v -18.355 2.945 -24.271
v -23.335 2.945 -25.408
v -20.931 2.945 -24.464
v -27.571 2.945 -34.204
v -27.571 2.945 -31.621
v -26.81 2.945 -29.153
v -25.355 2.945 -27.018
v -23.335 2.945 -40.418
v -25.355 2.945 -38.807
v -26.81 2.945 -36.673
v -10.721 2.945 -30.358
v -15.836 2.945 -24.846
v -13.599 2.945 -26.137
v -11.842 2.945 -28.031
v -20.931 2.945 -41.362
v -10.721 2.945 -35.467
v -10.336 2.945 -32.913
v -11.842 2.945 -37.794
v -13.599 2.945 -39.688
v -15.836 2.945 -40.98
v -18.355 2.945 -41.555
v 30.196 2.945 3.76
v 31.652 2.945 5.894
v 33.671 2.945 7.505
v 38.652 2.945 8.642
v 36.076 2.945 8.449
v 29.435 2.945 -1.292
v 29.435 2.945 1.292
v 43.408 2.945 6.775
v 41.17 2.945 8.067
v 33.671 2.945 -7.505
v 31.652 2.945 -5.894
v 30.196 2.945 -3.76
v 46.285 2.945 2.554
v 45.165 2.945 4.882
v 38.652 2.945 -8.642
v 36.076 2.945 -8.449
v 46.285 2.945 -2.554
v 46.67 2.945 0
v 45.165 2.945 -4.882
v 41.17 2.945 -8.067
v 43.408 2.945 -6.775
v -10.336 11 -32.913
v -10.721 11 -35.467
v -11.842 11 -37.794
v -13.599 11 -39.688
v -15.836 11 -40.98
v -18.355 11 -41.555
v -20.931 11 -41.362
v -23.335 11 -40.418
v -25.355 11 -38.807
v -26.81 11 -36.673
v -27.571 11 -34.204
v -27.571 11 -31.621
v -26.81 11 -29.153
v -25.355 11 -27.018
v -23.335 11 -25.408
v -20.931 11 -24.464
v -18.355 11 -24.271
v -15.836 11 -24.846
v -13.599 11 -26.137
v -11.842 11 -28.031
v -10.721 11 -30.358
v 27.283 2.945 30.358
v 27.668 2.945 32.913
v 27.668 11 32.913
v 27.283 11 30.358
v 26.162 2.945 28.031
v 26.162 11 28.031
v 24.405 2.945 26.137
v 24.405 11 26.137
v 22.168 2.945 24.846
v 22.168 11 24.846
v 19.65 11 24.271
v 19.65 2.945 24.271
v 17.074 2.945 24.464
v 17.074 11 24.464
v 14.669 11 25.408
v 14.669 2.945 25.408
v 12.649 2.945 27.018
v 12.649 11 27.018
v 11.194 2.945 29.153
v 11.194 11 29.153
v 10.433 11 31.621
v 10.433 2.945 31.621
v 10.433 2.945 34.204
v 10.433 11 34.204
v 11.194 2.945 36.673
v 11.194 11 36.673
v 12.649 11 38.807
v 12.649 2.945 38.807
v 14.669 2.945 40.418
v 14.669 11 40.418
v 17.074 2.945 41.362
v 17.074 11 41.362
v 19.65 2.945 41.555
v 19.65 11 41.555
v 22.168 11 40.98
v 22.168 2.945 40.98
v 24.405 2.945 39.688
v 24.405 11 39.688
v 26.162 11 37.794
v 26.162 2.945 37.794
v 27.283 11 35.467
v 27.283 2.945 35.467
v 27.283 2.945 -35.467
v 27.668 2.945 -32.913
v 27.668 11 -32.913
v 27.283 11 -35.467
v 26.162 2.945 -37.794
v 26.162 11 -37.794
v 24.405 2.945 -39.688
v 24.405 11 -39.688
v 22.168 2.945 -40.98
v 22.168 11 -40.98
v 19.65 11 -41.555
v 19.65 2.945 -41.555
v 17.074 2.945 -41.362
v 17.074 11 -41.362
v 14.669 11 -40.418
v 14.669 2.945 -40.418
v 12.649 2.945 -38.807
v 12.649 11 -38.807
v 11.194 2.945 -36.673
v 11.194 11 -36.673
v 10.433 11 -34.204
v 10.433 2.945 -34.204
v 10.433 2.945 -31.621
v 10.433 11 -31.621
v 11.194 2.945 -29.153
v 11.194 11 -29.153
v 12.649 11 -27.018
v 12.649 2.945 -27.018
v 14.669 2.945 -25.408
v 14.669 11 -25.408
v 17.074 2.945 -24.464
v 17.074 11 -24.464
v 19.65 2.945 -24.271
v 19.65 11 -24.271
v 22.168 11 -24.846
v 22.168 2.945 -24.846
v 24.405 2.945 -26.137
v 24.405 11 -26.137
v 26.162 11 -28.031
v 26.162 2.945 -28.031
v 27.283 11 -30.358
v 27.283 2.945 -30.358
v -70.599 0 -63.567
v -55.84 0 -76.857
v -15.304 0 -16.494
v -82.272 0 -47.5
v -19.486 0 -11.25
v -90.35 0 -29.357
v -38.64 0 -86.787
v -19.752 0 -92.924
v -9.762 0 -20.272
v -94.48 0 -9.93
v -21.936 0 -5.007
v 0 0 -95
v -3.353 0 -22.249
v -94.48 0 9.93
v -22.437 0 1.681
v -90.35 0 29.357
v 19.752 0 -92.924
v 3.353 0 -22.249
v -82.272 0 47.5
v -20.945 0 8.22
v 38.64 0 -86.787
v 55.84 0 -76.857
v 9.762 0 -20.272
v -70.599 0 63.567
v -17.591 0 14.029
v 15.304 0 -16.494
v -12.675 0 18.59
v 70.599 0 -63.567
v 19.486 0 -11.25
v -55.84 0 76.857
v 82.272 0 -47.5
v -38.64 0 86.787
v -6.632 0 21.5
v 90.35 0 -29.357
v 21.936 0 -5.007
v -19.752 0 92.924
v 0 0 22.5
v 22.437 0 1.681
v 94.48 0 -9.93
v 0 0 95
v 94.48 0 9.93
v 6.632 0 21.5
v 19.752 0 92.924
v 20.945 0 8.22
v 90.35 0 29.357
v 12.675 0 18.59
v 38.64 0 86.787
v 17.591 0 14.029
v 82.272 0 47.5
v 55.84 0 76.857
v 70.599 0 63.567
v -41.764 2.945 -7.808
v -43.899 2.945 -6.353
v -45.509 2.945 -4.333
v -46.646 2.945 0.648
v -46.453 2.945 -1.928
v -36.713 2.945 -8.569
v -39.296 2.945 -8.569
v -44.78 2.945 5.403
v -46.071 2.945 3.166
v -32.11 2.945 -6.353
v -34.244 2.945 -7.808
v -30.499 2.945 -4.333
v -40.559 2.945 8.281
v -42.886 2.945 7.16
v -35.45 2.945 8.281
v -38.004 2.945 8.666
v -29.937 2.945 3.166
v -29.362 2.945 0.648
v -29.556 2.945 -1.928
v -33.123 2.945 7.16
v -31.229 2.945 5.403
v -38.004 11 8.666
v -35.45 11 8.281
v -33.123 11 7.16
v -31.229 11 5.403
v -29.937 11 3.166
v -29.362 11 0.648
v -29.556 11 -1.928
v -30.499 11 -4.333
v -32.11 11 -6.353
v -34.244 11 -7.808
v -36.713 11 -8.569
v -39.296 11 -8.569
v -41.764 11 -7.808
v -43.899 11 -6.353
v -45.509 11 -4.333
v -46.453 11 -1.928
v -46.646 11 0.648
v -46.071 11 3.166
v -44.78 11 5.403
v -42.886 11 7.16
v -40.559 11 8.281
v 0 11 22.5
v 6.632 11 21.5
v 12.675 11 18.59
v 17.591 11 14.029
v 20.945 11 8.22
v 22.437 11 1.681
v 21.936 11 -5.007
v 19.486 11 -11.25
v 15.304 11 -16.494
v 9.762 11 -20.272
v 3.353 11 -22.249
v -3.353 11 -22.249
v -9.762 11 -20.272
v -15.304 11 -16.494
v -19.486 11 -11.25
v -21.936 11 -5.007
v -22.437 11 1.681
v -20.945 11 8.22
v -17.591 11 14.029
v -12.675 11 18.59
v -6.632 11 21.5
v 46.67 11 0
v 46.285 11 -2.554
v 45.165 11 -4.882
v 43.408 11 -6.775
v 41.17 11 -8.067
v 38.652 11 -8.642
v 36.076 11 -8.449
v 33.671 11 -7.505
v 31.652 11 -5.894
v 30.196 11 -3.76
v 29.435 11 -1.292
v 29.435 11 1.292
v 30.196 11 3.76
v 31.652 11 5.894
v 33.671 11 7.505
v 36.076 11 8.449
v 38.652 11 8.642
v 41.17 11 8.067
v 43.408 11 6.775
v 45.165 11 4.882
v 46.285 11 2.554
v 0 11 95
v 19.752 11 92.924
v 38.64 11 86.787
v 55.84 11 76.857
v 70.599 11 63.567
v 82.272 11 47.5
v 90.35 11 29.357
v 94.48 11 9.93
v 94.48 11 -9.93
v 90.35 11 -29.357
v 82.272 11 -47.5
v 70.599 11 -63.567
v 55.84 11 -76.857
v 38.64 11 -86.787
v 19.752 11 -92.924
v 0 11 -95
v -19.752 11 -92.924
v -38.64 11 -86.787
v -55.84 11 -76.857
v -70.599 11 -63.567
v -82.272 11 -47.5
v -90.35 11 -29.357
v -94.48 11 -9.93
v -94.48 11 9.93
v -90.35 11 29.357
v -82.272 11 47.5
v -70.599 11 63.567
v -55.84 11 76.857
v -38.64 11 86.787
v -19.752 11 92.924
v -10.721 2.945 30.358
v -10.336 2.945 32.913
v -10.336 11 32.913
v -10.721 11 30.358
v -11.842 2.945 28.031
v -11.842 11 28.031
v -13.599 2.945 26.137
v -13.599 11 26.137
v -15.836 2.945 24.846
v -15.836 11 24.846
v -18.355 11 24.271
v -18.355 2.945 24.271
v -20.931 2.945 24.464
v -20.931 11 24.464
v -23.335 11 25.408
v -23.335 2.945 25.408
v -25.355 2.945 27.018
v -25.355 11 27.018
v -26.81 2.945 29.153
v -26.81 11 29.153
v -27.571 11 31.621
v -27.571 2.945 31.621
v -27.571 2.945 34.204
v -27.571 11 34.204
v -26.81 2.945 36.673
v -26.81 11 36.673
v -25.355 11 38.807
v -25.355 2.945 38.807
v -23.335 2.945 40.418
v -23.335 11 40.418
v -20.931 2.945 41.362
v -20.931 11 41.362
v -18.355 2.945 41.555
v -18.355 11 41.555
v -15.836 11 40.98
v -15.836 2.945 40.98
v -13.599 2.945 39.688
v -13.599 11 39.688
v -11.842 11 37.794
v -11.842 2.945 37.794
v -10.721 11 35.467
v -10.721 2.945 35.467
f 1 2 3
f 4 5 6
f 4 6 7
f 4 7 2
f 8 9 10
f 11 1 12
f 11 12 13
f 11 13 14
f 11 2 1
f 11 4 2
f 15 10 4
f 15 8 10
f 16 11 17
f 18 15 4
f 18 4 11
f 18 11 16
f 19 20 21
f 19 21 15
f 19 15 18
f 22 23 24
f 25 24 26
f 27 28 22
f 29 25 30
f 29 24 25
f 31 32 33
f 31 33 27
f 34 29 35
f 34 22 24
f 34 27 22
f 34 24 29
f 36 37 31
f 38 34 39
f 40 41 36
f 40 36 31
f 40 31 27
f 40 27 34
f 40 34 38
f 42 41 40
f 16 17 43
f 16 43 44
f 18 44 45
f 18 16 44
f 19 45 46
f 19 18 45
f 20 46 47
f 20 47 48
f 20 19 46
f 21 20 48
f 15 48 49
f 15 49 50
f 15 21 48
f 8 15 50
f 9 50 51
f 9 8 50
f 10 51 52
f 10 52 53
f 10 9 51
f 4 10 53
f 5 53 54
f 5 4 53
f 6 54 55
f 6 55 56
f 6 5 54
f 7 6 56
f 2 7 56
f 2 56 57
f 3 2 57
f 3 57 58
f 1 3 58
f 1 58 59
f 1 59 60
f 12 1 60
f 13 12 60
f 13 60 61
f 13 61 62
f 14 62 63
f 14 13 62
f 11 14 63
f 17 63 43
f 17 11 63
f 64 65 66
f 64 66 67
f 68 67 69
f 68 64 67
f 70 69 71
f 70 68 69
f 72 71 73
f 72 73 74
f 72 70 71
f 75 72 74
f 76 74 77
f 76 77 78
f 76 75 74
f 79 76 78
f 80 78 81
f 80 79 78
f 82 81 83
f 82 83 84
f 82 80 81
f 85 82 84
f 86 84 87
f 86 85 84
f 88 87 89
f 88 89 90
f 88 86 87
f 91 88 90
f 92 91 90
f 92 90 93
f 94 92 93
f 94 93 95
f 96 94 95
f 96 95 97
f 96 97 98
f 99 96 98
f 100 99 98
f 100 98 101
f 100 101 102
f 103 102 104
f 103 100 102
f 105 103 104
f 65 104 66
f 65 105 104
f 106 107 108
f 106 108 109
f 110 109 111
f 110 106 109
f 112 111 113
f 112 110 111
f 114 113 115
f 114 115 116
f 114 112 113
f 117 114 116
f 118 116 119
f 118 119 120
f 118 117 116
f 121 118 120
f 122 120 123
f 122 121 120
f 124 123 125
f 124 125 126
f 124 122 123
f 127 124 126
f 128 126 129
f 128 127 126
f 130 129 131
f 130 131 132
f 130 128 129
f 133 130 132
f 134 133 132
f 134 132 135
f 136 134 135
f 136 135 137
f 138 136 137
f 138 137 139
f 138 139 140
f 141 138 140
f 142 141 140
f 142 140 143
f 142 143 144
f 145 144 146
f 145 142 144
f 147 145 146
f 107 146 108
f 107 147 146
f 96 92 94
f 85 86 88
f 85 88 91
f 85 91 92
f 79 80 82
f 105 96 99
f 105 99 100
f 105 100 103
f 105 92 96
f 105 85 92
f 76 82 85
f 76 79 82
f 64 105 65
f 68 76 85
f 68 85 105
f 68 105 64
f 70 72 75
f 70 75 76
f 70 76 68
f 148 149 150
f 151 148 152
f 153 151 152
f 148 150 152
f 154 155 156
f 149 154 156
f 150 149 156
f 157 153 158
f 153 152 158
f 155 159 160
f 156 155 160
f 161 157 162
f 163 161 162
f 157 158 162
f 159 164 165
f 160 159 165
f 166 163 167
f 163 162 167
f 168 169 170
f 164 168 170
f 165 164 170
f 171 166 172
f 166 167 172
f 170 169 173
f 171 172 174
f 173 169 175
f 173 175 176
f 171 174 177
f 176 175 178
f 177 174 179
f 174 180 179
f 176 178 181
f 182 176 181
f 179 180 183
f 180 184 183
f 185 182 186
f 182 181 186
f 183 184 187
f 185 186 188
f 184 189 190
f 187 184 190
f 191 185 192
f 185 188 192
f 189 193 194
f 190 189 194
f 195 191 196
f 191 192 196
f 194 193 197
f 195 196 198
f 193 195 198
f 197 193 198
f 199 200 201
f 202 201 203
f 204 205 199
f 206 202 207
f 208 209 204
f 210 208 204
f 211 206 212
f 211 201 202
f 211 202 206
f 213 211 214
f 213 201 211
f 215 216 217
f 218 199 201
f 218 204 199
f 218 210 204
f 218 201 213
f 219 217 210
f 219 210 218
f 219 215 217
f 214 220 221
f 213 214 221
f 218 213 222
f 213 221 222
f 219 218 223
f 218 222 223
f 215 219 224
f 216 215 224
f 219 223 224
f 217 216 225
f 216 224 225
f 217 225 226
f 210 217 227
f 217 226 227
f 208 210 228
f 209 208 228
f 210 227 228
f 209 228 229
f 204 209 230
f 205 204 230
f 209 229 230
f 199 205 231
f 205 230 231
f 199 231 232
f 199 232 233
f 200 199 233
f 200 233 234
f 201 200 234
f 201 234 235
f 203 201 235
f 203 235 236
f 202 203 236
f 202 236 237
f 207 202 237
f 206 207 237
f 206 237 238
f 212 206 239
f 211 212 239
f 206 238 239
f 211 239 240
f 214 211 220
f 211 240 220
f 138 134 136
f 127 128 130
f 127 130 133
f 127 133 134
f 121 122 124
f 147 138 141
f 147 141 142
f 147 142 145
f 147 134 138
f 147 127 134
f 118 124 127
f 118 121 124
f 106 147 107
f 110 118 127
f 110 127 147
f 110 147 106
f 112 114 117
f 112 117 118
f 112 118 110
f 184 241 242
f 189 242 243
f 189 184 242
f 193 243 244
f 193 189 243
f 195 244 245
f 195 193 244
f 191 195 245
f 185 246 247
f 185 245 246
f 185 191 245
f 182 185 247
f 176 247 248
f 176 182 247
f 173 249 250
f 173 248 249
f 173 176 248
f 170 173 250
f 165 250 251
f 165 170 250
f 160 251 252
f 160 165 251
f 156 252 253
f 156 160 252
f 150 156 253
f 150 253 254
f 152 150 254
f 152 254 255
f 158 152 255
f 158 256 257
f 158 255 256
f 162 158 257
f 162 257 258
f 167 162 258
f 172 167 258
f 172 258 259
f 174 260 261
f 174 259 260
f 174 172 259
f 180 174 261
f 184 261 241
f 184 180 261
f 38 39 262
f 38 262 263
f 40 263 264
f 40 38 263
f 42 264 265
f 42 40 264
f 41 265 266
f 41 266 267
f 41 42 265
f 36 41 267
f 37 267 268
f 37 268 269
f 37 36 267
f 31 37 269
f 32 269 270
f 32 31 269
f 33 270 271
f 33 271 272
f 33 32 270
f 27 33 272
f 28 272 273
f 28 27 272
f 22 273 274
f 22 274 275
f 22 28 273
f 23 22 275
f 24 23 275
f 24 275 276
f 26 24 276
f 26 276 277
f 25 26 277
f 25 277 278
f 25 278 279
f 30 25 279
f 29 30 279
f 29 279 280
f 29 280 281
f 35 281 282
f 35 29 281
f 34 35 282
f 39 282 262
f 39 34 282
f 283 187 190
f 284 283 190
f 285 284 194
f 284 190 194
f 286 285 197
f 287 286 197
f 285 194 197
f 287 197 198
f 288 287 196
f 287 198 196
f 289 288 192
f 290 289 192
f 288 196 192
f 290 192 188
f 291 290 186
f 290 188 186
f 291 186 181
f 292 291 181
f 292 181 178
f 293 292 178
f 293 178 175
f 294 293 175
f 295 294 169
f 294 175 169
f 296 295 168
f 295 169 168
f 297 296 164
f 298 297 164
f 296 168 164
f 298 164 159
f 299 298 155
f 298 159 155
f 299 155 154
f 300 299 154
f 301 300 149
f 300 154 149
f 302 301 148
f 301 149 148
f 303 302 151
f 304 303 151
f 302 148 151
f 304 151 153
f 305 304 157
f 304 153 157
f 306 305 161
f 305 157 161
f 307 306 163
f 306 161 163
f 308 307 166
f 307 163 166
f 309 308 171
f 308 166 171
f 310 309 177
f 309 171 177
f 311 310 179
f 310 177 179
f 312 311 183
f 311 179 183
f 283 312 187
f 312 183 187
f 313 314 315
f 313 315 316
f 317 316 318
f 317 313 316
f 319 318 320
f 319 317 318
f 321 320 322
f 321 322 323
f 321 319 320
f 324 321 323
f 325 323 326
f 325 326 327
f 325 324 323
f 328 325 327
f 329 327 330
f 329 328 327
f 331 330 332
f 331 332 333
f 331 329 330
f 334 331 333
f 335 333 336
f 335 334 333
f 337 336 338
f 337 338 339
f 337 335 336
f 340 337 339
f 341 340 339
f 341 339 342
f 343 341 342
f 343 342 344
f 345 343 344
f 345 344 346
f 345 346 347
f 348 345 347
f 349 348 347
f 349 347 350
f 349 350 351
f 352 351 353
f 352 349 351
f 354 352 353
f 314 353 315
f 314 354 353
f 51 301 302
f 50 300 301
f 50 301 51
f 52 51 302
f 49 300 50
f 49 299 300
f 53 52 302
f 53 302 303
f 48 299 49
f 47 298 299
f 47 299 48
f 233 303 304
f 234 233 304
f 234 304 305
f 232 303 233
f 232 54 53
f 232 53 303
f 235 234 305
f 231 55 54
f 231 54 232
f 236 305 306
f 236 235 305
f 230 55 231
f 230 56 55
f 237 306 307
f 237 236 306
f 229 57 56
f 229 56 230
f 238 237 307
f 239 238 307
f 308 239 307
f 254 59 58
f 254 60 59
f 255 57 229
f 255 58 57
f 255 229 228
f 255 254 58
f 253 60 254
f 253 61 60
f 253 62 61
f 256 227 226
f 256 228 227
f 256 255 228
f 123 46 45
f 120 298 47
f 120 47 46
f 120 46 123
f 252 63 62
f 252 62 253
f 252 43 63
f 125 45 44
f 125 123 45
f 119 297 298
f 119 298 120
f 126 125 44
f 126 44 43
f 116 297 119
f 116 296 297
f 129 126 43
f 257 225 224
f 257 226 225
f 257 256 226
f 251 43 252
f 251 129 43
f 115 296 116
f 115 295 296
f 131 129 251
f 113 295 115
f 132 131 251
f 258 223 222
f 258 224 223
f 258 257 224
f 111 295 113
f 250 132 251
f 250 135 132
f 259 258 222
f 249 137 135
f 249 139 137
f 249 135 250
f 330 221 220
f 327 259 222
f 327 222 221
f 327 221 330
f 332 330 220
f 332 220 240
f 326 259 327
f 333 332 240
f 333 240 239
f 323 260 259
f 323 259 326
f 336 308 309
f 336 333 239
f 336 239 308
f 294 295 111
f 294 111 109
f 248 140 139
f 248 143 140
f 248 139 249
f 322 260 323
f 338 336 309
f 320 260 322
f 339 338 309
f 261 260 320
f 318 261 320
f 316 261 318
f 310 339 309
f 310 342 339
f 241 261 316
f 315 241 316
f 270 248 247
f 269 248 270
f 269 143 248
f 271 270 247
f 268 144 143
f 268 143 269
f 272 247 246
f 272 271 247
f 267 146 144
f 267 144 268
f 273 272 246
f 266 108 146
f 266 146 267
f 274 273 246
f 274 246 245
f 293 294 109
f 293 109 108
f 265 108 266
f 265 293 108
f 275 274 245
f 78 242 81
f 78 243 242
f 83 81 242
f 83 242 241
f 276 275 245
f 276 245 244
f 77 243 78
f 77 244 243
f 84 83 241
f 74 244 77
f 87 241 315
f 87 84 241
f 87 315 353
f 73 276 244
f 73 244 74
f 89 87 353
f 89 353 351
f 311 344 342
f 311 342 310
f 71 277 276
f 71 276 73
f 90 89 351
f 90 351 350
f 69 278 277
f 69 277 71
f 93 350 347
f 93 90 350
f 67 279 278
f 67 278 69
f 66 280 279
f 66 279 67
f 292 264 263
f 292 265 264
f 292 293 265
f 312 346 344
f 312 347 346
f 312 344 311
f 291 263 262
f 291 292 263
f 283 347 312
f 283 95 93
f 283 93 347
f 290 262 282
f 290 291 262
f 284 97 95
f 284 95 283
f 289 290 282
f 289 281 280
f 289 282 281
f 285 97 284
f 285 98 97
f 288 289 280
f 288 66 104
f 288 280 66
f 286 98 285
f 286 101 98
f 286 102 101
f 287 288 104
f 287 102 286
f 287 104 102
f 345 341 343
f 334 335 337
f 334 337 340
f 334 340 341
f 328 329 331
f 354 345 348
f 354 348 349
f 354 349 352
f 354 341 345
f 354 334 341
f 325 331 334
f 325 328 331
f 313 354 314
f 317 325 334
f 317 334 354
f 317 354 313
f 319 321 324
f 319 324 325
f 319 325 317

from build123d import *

# Parameters (mm, degrees)
SKETCH1_R           = 95
BOSS_EXTRUDE1_DEPTH = 11
SKETCH2_R           = 22.5
CUT_EXTRUDE1_DEPTH  = 135.799851632
SKETCH3_R           = 8.666088256
CUT_EXTRUDE2_DEPTH  = 8.054691676
CIRPATTERN1_COUNT   = 6


with BuildPart() as part:
    # Sketch1 → Boss-Extrude1 (new body)
    with BuildSketch(Plane(origin=(0, 0, 0), x_dir=(1, 0, 0), z_dir=(0, 1, 0))):
        Circle(SKETCH1_R)
    extrude(amount=BOSS_EXTRUDE1_DEPTH)

    # Sketch2 → Cut-Extrude1 (cut, through all)
    with BuildSketch(Plane(origin=(0, 0, 0), x_dir=(1, 0, 0), z_dir=(0, 1, 0))):
        Circle(SKETCH2_R)
    extrude(amount=CUT_EXTRUDE1_DEPTH, mode=Mode.SUBTRACT)

    # Sketch3 → Cut-Extrude2 (cut)
    with BuildSketch(Plane(origin=(0, 11, 0), x_dir=(1, 0, 0), z_dir=(0, 1, 0))):
        with Locations((-38.00433364, 0)):
            Circle(SKETCH3_R)
    cut_extrude2 = extrude(amount=-CUT_EXTRUDE2_DEPTH, mode=Mode.SUBTRACT)

    # CirPattern1: Cut-Extrude2 ×6 about axis
    cirpattern1_axis = Axis((0, 0, 0), (0, 1, 0))
    for i in range(1, CIRPATTERN1_COUNT):
        add(cut_extrude2.rotate(cirpattern1_axis, i * 360 / CIRPATTERN1_COUNT), mode=Mode.SUBTRACT)


solid = part.part
